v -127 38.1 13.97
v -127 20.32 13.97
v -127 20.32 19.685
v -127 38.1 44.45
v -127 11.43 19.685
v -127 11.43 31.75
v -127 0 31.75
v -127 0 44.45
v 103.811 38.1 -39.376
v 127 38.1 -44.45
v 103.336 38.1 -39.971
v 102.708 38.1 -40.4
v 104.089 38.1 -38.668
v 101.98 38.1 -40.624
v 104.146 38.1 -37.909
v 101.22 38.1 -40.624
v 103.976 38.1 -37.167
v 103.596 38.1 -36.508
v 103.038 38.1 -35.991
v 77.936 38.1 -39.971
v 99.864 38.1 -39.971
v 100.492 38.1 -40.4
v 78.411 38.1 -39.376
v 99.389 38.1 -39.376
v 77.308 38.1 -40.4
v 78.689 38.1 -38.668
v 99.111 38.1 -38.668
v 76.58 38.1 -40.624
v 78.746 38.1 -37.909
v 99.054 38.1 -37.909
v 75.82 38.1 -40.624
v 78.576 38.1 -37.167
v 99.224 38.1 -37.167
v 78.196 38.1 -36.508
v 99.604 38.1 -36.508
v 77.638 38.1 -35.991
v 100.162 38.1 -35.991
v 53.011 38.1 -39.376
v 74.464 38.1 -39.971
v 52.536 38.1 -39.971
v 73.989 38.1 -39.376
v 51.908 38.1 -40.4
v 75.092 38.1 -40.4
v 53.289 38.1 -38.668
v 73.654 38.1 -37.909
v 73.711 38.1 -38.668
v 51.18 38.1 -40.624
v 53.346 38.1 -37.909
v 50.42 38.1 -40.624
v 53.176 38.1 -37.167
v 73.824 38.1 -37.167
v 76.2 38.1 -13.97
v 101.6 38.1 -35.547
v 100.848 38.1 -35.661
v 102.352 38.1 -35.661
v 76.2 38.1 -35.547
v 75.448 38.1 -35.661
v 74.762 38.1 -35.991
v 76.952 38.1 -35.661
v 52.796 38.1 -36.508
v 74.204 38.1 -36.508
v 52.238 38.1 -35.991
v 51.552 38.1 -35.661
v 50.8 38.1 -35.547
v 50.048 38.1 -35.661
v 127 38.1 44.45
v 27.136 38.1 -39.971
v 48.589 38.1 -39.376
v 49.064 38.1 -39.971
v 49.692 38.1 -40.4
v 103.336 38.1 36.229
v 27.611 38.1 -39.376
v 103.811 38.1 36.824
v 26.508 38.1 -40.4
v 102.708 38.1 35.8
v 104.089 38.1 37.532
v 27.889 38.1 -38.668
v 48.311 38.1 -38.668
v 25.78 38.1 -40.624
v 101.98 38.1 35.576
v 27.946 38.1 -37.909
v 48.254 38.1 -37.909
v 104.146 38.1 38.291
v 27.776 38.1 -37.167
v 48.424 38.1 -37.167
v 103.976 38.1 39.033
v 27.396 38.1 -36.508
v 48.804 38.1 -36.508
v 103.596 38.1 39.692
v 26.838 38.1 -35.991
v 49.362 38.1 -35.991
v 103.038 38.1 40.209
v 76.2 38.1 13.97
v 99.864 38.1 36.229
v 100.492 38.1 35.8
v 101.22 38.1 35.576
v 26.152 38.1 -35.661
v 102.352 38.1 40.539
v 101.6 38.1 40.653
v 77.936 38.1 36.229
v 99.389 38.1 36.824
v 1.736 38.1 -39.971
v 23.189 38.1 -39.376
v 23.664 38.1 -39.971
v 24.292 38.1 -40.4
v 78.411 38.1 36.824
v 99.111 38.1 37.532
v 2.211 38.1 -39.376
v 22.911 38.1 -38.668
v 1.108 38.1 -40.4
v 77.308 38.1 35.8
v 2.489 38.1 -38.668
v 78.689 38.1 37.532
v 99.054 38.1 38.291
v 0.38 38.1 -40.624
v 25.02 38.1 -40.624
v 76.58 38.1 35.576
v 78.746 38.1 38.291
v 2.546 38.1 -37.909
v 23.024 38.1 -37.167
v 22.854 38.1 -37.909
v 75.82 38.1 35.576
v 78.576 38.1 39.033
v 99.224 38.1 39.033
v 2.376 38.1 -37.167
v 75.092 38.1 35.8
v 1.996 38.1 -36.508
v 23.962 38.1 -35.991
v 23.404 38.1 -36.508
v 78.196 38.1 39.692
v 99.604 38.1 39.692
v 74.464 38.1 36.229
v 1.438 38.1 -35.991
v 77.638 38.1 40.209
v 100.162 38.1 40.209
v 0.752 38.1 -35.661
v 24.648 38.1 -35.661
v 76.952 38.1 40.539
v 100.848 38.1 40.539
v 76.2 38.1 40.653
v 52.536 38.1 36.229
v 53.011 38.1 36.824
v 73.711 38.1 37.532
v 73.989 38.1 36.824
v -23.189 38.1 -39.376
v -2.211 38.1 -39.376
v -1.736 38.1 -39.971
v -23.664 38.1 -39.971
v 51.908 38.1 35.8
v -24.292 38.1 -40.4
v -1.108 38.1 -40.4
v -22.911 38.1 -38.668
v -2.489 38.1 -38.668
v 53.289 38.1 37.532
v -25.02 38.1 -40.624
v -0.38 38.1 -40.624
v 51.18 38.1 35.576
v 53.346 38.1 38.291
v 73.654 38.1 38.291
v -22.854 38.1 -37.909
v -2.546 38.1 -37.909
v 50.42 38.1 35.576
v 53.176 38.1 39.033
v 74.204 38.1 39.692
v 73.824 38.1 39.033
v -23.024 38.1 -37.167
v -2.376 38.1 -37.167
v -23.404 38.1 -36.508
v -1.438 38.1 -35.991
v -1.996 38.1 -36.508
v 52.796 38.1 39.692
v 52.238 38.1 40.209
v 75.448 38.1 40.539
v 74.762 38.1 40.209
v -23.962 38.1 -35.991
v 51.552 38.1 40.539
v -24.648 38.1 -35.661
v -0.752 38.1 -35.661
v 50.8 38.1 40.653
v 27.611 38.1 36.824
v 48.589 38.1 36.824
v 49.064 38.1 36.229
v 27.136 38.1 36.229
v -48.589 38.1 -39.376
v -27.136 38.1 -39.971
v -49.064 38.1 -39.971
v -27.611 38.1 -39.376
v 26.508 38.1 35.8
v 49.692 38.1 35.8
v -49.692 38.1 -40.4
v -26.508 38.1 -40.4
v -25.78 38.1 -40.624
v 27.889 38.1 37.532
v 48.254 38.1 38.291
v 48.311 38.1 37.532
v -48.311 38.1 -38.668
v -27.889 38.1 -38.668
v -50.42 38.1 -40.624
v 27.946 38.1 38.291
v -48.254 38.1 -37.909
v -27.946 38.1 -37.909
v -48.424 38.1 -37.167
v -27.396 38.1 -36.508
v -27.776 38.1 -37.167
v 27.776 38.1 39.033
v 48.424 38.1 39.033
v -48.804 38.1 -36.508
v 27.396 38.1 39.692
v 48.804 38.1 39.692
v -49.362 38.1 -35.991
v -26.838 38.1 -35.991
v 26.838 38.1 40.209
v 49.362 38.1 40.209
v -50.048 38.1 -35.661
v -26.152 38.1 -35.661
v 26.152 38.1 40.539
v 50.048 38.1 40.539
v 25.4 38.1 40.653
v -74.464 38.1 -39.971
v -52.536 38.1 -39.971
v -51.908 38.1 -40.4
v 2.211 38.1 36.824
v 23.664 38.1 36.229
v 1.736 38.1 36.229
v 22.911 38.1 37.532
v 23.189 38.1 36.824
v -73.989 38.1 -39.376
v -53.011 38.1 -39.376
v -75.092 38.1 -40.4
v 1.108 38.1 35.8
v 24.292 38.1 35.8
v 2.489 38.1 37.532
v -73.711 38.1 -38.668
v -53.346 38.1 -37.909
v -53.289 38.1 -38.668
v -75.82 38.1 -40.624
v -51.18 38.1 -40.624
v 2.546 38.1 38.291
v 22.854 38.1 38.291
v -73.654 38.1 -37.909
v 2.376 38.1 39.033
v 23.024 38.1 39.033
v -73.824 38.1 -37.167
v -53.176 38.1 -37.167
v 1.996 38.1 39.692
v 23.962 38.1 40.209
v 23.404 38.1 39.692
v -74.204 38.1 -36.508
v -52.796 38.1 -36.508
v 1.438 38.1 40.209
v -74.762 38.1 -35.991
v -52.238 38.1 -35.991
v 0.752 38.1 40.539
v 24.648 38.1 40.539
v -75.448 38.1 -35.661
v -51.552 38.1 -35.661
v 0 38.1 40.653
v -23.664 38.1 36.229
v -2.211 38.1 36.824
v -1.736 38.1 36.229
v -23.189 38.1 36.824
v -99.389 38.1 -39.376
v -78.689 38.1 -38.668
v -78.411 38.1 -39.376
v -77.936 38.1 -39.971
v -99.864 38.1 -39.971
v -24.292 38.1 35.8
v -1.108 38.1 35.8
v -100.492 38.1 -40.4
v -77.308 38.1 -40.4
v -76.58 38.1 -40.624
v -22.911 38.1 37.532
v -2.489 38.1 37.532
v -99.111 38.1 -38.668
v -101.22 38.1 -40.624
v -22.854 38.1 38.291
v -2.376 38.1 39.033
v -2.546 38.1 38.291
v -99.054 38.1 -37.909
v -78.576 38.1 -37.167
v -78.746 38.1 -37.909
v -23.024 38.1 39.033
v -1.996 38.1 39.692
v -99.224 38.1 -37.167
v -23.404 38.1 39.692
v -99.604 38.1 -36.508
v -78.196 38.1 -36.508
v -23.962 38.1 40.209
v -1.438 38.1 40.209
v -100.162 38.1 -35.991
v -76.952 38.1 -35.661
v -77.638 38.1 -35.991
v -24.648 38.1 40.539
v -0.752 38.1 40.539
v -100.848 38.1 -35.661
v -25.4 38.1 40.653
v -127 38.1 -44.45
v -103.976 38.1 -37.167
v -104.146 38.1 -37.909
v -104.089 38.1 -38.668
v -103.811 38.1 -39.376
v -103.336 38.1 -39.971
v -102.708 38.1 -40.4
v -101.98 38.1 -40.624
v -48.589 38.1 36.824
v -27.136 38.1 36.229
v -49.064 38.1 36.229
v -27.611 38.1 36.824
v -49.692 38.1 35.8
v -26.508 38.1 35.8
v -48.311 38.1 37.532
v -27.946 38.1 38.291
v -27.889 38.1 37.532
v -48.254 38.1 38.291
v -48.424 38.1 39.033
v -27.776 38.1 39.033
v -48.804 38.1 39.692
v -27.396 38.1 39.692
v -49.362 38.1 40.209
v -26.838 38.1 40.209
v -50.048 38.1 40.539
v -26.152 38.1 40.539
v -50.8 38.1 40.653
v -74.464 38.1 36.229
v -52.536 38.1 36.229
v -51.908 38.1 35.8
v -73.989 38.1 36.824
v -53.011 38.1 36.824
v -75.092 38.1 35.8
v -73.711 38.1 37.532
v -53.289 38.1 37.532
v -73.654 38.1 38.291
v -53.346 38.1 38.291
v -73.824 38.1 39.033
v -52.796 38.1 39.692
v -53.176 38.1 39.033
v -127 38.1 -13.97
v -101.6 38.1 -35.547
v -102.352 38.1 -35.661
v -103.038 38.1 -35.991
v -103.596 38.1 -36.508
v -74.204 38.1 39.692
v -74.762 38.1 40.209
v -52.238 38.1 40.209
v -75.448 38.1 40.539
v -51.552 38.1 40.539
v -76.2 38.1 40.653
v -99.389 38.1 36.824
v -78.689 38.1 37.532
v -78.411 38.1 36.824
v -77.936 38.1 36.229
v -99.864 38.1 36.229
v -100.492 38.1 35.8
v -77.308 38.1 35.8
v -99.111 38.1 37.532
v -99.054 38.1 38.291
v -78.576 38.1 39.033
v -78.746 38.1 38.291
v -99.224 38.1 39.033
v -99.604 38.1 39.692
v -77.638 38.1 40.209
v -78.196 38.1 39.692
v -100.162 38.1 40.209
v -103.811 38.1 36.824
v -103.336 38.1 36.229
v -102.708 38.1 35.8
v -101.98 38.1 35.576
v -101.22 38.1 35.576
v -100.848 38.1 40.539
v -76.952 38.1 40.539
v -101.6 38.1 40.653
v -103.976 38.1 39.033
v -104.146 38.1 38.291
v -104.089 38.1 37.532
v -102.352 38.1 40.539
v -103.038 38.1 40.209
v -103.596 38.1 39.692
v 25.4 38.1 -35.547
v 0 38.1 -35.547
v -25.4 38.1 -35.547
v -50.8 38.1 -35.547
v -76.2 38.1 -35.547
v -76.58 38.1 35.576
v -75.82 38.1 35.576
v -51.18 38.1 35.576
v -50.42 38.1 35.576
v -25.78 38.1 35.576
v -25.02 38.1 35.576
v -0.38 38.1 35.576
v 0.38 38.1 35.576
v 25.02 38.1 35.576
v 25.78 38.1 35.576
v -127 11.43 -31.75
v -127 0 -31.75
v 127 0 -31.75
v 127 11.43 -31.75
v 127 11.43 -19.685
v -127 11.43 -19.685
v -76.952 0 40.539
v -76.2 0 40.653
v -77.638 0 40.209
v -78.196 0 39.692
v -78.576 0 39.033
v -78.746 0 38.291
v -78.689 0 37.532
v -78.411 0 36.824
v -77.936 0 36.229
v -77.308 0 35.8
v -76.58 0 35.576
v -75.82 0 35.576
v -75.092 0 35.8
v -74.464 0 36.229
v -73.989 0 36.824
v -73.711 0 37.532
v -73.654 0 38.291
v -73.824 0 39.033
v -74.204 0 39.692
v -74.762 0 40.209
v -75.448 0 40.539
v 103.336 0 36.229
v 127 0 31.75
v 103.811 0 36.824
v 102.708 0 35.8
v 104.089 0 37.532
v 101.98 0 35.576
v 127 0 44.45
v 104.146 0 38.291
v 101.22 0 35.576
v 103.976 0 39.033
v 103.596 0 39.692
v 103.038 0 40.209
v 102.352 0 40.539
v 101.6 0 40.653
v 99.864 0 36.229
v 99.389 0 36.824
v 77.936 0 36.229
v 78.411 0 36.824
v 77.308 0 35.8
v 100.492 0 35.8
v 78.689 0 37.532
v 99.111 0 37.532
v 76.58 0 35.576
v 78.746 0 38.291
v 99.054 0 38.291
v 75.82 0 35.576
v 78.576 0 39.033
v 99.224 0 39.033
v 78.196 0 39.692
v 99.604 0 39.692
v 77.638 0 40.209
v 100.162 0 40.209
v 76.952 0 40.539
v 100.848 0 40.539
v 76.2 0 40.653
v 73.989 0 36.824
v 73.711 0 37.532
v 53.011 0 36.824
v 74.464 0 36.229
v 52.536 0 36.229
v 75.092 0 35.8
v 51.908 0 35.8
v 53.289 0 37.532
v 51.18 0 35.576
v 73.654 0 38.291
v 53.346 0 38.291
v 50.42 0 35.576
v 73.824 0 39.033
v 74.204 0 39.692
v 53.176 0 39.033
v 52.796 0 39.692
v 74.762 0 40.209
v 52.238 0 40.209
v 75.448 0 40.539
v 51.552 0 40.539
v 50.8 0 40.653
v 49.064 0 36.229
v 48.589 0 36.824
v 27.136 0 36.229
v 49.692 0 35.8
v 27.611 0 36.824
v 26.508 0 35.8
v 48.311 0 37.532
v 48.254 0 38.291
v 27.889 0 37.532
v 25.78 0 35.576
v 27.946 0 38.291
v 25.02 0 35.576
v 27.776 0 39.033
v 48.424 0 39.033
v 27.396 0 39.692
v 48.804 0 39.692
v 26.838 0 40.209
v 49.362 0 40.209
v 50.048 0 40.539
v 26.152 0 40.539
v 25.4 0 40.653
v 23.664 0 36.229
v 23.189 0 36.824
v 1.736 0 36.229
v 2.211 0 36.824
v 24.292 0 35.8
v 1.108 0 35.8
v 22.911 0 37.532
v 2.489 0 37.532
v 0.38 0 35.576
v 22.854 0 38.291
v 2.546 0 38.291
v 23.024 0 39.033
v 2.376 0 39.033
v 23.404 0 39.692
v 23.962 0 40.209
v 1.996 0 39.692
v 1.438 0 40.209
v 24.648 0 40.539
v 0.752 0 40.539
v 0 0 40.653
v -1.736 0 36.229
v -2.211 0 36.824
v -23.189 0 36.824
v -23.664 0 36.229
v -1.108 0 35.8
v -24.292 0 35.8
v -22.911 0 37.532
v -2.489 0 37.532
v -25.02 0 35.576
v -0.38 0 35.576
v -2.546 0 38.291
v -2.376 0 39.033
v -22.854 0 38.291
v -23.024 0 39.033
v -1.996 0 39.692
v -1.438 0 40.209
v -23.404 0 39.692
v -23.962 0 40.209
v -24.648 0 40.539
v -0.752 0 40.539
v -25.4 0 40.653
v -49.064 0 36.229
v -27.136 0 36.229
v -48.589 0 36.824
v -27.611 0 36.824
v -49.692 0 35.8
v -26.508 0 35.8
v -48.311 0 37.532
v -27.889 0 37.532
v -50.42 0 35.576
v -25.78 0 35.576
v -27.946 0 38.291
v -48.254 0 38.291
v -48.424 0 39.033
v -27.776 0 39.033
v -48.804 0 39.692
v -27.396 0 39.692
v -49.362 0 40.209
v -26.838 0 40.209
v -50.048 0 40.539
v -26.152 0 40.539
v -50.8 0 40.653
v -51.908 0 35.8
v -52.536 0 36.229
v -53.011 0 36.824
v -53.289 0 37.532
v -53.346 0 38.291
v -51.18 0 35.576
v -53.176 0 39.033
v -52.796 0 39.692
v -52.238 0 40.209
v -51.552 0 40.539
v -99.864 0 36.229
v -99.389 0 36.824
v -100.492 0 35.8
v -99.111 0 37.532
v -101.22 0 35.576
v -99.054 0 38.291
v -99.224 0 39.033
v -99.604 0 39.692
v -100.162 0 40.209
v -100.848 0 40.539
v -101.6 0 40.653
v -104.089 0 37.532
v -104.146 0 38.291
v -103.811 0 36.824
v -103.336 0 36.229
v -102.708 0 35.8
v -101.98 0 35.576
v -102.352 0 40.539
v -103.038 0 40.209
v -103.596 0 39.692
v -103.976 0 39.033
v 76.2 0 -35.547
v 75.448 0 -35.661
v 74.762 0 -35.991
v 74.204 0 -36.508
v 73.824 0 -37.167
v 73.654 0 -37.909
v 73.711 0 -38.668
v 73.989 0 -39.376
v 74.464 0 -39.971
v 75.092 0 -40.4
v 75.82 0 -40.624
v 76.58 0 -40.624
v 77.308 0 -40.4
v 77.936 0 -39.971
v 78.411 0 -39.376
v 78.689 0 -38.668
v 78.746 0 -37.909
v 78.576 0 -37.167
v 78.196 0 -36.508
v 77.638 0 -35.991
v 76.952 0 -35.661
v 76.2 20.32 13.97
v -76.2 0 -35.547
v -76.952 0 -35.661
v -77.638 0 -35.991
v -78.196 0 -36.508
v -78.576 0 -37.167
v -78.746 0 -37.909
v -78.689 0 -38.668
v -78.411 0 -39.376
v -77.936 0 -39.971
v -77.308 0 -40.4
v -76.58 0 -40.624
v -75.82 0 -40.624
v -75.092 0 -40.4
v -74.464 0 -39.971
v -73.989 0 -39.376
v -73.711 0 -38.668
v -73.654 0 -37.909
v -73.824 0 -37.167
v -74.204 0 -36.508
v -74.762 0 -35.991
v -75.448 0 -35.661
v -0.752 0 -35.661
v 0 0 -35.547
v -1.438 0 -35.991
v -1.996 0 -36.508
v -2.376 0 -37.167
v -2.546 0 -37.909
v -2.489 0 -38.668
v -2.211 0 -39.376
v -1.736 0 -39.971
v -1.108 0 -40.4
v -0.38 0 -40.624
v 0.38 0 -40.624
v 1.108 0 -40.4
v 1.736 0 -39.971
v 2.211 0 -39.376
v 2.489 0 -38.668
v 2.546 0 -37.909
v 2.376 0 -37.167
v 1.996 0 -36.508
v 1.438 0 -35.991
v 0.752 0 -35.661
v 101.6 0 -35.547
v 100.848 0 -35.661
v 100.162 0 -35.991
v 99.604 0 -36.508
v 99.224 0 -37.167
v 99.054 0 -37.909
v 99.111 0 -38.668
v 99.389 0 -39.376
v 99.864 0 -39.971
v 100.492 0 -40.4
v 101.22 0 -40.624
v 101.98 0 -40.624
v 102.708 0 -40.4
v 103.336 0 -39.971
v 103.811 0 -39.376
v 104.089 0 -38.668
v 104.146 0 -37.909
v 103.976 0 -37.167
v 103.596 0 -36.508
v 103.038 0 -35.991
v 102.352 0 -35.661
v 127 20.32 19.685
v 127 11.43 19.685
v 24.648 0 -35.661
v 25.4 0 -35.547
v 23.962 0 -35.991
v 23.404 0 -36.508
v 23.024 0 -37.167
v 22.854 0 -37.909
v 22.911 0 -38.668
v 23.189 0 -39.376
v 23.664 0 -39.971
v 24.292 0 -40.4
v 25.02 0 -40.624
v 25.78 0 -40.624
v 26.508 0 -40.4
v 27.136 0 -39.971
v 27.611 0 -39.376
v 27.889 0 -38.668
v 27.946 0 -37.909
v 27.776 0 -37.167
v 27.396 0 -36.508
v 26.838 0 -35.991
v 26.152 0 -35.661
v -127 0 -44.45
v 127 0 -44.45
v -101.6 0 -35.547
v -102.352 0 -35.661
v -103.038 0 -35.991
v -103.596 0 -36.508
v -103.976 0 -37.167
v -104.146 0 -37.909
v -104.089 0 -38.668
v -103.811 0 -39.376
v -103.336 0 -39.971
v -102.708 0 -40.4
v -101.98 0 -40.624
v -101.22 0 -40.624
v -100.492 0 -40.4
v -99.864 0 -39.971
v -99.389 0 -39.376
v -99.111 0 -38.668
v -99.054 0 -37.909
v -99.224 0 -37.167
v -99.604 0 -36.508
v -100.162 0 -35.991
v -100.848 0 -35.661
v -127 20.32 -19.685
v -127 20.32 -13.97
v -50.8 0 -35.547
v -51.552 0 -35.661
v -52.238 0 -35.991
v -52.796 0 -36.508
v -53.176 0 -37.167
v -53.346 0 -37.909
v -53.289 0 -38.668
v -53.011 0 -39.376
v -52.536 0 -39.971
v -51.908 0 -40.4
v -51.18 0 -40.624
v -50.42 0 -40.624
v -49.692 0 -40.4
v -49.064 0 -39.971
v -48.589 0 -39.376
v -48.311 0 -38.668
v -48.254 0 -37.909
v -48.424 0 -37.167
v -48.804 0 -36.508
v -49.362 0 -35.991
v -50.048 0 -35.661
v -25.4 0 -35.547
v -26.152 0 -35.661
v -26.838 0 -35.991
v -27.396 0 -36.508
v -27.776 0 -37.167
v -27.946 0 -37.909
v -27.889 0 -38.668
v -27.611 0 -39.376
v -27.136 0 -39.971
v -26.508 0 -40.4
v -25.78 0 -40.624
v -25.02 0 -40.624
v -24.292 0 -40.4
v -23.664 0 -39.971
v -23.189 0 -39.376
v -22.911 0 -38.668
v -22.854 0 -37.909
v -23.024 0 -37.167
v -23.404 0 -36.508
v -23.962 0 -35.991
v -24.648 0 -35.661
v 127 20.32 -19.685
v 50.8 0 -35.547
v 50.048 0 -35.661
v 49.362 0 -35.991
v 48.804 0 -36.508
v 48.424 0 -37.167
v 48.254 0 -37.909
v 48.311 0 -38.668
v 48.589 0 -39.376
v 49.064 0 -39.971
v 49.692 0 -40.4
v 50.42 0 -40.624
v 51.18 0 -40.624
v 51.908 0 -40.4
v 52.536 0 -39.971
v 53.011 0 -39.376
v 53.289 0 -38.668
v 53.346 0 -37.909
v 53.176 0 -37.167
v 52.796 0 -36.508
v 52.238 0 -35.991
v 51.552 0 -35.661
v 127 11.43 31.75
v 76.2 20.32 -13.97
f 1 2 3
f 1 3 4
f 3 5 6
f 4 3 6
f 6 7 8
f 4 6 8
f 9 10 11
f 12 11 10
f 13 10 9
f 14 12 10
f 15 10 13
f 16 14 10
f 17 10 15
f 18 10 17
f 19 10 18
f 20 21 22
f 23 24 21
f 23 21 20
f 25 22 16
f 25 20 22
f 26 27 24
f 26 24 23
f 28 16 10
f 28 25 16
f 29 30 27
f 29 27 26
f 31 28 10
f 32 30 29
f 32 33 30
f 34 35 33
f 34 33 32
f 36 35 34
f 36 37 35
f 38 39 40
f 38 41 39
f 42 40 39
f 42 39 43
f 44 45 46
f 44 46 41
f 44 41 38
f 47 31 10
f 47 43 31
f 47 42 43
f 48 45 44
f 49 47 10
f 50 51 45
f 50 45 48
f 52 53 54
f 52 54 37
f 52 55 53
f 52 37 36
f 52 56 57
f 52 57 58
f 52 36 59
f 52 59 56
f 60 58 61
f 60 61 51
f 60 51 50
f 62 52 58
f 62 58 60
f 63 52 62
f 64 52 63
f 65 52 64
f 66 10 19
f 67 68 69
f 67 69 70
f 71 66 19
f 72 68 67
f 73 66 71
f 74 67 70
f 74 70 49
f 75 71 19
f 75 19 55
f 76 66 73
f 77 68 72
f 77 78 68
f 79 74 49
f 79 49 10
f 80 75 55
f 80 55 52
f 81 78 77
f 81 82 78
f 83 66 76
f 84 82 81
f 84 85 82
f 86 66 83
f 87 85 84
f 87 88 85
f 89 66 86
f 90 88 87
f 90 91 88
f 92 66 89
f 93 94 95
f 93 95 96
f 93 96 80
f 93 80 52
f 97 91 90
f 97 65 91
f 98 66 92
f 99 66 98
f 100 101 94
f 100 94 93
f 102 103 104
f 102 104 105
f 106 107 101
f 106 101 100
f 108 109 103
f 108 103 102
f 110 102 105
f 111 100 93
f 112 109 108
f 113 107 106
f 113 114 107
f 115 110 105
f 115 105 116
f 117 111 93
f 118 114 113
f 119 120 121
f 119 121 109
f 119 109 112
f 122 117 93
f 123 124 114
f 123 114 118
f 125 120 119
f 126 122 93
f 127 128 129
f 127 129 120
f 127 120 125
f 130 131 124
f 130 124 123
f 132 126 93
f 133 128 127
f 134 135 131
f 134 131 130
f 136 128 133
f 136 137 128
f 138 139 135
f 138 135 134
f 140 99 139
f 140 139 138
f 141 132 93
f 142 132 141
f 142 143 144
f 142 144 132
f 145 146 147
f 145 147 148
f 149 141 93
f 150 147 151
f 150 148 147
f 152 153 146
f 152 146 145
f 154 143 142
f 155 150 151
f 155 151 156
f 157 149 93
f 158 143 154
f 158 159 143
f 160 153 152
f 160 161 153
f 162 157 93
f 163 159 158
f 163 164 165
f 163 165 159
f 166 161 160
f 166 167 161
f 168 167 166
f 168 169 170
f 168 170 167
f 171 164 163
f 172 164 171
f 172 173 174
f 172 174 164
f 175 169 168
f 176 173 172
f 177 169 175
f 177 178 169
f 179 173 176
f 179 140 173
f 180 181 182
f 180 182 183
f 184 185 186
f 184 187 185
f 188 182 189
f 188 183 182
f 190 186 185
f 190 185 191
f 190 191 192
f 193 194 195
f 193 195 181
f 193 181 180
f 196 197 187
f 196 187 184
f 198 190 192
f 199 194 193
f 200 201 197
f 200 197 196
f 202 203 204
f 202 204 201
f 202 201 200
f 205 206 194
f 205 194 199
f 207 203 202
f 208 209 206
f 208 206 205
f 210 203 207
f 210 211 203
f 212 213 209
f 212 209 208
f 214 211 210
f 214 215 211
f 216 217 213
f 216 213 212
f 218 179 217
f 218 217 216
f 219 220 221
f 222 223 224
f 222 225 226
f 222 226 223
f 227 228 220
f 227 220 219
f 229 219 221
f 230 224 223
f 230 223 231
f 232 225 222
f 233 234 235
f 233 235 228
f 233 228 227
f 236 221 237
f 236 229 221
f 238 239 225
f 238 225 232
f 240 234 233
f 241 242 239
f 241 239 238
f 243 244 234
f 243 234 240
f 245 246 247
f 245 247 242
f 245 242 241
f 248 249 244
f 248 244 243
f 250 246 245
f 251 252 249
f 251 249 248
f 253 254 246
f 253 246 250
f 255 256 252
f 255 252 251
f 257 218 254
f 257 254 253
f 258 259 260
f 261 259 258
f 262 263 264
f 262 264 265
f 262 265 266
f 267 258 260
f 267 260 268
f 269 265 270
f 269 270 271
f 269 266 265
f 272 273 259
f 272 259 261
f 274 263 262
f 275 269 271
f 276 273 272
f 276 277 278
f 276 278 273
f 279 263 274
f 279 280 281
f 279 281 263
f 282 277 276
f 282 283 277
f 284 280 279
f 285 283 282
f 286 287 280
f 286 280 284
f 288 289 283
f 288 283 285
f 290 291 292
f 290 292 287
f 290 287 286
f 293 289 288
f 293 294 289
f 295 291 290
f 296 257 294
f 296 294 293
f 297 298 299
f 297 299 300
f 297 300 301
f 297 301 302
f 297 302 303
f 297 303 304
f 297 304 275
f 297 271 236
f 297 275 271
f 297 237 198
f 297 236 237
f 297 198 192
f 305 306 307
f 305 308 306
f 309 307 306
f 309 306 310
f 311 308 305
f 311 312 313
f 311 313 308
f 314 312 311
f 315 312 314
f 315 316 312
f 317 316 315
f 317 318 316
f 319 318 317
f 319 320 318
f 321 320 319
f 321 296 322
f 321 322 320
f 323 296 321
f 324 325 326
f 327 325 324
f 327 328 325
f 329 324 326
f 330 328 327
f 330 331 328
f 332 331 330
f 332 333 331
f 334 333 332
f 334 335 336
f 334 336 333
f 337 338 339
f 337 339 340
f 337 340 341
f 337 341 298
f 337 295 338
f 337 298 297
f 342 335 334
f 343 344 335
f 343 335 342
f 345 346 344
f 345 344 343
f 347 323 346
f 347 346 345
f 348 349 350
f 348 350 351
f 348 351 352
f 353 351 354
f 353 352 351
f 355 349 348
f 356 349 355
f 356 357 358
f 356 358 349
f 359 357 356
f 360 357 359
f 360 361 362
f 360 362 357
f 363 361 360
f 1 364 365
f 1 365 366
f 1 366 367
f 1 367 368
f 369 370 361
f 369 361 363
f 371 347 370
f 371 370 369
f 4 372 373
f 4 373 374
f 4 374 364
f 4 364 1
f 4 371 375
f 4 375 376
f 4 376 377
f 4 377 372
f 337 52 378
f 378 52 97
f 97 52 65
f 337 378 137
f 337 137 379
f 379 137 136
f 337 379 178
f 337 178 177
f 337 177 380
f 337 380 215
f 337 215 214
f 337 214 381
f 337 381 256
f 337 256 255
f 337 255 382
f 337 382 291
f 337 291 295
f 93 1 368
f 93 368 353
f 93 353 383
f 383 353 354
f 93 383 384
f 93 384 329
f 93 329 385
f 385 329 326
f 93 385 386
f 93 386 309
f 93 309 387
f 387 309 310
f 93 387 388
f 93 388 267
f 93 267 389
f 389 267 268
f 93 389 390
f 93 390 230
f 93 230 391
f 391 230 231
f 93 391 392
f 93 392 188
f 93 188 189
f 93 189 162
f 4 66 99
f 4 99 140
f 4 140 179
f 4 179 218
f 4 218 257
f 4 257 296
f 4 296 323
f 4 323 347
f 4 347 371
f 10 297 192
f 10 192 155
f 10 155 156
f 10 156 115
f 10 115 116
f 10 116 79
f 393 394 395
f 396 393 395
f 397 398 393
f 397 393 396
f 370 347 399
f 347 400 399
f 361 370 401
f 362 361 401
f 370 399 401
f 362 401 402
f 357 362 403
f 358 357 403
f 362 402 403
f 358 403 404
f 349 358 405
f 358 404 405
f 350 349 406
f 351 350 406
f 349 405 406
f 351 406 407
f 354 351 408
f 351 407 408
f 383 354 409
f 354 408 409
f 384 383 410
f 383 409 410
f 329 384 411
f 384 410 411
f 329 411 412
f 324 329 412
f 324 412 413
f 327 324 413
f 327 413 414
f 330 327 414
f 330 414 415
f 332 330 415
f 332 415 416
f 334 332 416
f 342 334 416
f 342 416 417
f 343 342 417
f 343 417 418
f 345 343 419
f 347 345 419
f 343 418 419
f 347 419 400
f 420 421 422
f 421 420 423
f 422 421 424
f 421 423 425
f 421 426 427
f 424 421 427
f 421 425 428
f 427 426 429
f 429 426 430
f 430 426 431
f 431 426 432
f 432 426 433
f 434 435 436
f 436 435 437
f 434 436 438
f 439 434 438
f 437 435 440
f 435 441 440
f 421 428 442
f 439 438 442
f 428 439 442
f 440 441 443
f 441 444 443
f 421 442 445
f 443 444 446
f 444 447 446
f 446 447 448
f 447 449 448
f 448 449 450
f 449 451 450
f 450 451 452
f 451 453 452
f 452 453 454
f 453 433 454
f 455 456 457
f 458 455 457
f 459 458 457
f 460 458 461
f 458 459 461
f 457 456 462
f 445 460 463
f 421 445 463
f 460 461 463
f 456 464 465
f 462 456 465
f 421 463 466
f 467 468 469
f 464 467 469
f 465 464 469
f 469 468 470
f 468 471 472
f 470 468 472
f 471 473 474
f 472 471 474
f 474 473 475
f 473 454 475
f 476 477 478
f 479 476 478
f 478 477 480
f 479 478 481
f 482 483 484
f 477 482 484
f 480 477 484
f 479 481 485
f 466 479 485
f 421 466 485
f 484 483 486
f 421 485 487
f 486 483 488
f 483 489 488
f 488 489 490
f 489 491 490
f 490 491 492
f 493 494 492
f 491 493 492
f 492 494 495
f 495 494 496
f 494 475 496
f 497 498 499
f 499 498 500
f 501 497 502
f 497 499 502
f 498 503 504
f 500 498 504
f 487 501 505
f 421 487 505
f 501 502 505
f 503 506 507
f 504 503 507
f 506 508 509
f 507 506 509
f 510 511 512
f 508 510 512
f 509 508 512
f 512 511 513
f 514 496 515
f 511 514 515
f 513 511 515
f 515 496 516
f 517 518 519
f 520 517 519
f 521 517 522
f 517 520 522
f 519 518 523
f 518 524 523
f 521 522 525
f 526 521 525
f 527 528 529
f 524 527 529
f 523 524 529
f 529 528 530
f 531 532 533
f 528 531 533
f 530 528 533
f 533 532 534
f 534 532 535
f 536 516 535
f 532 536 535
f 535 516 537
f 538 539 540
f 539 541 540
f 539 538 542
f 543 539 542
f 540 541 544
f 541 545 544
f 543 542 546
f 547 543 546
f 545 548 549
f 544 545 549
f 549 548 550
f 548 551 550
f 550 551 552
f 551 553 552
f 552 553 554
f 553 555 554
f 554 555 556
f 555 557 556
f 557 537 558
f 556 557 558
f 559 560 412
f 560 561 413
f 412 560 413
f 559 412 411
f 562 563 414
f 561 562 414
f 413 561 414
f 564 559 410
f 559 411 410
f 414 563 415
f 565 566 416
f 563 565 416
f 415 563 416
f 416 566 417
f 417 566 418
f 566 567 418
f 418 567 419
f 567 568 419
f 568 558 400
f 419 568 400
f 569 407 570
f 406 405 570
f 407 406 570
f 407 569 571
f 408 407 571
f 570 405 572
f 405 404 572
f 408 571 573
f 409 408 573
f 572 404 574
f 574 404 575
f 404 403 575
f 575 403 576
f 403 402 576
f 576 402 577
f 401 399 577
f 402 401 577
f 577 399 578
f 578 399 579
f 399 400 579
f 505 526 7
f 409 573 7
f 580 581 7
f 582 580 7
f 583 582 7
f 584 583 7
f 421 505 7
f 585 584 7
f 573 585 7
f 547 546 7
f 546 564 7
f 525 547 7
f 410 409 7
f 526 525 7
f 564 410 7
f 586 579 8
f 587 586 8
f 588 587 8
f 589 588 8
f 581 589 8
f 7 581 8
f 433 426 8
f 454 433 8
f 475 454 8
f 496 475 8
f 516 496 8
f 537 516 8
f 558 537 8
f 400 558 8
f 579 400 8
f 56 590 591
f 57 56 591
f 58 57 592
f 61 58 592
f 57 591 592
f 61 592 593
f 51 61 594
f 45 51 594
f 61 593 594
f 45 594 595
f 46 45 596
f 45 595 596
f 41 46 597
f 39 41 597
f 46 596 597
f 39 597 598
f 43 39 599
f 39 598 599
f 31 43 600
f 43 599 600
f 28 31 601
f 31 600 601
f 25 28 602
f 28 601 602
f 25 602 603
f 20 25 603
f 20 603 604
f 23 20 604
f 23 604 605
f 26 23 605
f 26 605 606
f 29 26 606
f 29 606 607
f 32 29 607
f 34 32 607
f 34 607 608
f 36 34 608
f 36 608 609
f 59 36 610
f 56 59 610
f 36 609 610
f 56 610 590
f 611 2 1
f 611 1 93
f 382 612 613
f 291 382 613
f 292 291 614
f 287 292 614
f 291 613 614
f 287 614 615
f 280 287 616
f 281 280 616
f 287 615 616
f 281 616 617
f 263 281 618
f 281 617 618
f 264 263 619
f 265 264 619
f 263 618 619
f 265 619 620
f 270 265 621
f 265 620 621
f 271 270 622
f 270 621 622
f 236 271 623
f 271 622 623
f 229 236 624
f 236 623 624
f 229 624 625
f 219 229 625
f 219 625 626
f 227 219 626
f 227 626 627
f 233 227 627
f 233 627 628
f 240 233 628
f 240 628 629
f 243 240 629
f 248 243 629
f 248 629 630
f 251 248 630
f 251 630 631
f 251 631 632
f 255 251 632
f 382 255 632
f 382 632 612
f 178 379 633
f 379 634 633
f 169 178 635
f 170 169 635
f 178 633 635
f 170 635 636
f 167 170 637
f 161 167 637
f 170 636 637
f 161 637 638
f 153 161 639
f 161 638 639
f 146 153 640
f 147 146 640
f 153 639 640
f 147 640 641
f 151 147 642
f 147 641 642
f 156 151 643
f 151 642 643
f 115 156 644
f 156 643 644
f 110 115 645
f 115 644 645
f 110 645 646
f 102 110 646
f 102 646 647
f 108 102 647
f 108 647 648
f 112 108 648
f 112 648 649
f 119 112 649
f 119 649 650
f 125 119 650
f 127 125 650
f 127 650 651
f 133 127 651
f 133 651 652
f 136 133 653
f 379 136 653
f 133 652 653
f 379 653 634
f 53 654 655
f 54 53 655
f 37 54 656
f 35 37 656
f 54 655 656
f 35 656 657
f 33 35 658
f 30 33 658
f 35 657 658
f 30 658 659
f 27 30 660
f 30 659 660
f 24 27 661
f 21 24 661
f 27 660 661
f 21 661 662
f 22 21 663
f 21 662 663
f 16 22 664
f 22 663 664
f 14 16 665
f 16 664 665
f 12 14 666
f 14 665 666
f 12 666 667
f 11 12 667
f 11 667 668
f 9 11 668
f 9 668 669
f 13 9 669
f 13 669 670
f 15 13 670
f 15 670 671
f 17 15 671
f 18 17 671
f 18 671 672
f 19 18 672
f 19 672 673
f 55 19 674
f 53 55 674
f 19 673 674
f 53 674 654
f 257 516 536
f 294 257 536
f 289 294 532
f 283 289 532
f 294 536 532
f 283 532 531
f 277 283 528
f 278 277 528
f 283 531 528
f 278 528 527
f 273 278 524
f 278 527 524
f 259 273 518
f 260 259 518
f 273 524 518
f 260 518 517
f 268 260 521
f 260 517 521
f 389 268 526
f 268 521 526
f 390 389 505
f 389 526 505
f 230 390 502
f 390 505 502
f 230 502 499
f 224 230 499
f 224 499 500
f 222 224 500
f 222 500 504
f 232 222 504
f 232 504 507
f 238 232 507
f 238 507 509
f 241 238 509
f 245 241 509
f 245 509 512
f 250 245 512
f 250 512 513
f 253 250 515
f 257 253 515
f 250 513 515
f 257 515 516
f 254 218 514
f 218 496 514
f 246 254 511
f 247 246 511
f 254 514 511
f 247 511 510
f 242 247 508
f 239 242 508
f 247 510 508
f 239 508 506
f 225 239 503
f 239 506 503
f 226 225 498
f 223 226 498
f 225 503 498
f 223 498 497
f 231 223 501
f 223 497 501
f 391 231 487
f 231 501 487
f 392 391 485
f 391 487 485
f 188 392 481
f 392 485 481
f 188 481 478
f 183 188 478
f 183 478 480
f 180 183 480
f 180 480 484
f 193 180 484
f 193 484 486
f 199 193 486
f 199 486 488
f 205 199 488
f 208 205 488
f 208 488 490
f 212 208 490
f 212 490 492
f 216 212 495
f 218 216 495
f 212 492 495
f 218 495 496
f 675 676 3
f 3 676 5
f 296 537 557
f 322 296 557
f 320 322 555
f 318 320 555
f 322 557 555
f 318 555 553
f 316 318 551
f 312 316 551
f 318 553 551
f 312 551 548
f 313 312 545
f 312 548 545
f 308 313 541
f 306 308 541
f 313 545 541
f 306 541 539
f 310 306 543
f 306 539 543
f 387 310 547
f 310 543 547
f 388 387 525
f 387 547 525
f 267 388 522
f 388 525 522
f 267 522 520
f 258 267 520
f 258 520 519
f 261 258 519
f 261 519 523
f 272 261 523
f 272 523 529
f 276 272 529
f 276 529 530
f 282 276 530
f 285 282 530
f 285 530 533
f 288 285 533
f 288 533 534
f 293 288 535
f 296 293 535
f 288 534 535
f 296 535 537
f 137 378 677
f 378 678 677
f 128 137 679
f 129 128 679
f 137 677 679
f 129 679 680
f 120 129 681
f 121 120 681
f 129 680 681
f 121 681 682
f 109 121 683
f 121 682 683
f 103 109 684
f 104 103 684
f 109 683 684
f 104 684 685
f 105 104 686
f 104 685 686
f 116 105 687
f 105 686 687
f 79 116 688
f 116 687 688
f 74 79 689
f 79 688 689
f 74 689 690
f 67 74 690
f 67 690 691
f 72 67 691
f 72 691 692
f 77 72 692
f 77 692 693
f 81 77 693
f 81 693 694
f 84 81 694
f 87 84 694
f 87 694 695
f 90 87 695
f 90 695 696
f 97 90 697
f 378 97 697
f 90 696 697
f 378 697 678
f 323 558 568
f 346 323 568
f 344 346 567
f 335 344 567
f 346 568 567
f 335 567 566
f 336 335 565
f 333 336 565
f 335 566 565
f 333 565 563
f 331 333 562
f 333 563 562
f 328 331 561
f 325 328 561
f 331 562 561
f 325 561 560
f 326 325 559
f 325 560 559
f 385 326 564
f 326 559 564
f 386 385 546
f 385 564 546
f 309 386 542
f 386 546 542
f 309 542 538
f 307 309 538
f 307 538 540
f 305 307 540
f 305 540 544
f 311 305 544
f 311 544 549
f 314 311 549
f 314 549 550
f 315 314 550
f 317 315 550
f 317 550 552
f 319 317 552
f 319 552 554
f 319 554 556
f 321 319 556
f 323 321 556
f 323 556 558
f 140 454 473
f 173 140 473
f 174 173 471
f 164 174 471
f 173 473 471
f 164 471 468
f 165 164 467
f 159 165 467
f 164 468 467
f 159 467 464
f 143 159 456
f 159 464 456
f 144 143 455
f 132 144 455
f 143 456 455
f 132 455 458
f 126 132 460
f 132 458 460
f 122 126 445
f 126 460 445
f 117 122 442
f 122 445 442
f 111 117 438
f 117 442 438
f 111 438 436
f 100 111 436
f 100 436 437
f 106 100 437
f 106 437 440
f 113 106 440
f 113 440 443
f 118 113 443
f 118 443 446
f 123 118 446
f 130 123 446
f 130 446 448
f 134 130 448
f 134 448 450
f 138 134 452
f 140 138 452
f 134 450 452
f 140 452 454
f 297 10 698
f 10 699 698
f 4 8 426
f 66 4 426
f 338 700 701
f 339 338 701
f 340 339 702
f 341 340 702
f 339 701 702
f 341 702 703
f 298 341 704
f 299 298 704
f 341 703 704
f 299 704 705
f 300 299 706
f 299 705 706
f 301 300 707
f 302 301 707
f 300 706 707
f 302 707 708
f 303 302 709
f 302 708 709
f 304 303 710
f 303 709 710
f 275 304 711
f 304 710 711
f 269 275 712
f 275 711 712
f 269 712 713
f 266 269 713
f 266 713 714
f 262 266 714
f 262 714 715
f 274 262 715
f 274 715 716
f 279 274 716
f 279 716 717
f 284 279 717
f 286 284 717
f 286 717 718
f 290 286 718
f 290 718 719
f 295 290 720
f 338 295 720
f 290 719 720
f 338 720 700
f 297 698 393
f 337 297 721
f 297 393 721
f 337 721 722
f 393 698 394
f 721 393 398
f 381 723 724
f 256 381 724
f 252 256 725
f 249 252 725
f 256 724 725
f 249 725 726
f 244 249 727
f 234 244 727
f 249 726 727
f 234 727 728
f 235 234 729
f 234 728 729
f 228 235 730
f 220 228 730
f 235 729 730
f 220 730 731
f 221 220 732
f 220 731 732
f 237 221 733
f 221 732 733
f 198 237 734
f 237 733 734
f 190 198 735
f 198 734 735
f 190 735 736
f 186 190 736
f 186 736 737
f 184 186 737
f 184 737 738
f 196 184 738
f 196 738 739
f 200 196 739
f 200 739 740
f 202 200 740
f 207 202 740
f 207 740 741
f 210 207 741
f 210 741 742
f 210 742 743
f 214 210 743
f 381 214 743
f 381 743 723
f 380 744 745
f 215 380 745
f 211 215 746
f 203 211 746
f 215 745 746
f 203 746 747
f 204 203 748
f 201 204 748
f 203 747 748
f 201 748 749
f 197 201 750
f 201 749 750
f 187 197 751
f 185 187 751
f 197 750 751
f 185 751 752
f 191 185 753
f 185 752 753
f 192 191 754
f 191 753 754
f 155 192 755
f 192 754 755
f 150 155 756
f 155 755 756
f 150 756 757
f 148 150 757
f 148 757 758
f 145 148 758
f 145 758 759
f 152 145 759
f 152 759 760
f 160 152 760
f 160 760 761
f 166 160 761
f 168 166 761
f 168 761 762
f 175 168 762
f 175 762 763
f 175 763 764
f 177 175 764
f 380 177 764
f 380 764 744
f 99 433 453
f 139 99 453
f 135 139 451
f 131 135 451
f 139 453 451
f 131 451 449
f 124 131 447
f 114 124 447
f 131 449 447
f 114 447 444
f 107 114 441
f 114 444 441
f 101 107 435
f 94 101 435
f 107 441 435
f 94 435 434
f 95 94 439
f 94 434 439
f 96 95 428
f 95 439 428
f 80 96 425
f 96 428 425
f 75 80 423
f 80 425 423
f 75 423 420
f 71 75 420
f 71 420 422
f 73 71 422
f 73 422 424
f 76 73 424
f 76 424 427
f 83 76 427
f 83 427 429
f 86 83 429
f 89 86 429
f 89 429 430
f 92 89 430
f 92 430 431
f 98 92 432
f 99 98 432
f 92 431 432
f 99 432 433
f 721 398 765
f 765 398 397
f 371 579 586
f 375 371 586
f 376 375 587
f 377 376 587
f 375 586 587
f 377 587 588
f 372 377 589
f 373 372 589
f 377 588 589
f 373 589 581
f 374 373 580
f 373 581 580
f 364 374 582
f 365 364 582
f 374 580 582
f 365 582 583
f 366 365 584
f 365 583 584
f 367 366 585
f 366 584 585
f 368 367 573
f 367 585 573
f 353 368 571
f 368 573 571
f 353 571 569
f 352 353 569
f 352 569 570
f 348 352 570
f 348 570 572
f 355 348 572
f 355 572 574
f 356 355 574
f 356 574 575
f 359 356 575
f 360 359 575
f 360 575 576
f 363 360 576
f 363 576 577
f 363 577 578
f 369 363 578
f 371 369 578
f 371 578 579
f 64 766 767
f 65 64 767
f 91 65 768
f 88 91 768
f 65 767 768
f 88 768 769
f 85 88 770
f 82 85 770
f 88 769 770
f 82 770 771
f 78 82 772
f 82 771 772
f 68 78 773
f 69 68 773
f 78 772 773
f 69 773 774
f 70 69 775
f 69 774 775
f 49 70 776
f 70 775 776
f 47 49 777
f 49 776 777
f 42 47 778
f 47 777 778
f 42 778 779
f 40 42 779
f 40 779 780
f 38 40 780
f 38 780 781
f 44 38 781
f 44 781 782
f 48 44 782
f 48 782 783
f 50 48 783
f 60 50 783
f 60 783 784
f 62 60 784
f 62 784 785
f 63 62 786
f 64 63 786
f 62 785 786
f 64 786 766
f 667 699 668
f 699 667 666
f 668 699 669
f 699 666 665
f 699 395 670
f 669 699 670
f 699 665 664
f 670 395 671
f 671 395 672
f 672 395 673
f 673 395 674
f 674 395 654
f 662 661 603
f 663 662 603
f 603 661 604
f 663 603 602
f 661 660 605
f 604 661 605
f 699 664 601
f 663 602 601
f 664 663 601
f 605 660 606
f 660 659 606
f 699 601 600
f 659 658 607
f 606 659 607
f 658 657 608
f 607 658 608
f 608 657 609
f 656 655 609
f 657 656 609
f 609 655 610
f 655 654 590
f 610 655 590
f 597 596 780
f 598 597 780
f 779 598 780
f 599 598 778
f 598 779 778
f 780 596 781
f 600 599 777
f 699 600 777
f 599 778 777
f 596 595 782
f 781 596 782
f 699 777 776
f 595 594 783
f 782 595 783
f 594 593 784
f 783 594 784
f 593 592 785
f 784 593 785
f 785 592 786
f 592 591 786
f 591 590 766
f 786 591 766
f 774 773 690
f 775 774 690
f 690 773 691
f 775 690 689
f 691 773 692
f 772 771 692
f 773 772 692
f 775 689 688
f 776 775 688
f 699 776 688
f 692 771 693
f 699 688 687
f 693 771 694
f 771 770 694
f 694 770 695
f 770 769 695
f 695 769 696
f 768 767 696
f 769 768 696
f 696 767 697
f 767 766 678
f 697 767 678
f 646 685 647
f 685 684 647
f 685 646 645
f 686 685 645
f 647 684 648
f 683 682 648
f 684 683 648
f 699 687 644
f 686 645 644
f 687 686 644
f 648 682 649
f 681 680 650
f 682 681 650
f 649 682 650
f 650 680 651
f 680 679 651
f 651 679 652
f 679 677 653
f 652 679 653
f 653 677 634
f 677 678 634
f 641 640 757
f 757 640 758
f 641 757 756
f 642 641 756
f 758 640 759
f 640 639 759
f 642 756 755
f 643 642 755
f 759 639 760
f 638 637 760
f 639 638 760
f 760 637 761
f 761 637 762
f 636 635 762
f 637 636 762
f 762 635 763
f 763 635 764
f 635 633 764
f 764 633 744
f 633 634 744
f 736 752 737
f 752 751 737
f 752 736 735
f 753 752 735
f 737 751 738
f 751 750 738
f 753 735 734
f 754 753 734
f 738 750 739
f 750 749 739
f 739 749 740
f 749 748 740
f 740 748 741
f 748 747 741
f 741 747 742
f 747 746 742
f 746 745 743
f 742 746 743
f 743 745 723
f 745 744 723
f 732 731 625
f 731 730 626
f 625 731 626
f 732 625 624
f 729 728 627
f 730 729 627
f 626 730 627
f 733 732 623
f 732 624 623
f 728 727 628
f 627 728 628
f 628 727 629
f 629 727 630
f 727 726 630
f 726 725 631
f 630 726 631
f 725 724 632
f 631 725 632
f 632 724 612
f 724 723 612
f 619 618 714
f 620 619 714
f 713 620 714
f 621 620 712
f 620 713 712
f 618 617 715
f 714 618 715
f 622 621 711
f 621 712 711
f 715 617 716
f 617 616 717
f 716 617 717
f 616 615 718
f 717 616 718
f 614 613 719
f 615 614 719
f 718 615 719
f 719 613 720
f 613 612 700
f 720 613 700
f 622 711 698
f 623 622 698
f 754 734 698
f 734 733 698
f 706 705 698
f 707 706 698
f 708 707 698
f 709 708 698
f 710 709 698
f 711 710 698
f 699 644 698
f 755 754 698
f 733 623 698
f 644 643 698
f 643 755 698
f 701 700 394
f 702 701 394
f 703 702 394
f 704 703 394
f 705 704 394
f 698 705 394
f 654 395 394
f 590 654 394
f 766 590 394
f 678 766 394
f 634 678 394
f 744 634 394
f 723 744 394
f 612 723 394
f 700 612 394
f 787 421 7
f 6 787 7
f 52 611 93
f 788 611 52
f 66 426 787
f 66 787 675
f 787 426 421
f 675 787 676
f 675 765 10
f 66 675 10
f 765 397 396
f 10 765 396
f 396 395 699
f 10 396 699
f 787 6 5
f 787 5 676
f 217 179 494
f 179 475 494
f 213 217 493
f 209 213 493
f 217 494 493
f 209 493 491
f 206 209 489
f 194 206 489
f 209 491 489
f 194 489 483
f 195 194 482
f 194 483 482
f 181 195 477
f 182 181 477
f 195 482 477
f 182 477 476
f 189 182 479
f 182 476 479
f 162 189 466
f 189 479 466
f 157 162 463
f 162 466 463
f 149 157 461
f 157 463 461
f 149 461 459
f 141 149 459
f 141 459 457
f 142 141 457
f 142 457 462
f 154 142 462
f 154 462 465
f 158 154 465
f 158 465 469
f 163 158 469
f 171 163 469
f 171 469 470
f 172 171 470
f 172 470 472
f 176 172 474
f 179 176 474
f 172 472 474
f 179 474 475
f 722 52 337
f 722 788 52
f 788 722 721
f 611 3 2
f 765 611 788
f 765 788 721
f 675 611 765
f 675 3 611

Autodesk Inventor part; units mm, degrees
ref_plane "YZ Plane" through (0, 0, 0) normal (1, 0, 0) x (0, 1, 0)
ref_plane "XZ Plane" through (0, 0, 0) normal (0, 1, 0) x (-1, 0, 0)
sketch "Sketch1" plane through (0, 0, 0) normal (0, 1, 0) x (-1, 0, 0)
  line L0 (127, 44.45) -> (-127, 44.45)
  line L1 (-127, 44.45) -> (-127, -44.45)
  line L2 (-127, -44.45) -> (127, -44.45)
  line L3 (127, -44.45) -> (127, 44.45)
  line L4 (127, 44.45) -> (-127, -44.45) construction
  line L5 (-127, 44.45) -> (127, -44.45) construction
  point P0 (0, 0)
  dimension "d0" = 254
  dimension "d1" = 88.9
extrude "Extrusion1" add sketch "Sketch1" along normal blind 38.1
sketch "Sketch2" plane through (0, 0, 0) normal (0, -1, 0) x (1, 0, 0)
  line L0 (-131.2333, 19.685) -> (-131.2333, -19.685)
  line L1 (-131.2333, -19.685) -> (131.2333, -19.685)
  line L2 (131.2333, -19.685) -> (131.2333, 19.685)
  line L3 (131.2333, 19.685) -> (-131.2333, 19.685)
  line L4 (-131.2333, 19.685) -> (131.2333, -19.685) construction
  line L5 (-131.2333, -19.685) -> (131.2333, 19.685) construction
  point P0 (0, 0)
  dimension "d4" = 39.37
extrude "Extrusion2" cut sketch "Sketch2" against normal blind 20.32
sketch "Sketch3" plane through (0, 20.32, 0) normal (0, -1, 0) x (1, 0, 0)
  line L0 (-127, -19.685) -> (-127, 19.685) projected
  line L1 (76.2, 13.97) -> (76.2, -13.97)
  line L2 (76.2, -13.97) -> (-127, -13.97)
  line L3 (-127, -13.97) -> (-127, 13.97)
  line L4 (-127, 13.97) -> (76.2, 13.97)
  line L5 (76.2, 13.97) -> (-127, -13.97) construction
  line L6 (76.2, -13.97) -> (-127, 13.97) construction
  point P0 (0, 0)
  point P1 (-25.4, 0)
  point P2 (-127, -13.97)
  dimension "d7" = 101.6
  dimension "d8" = 27.94
extrude "Extrusion3" cut sketch "Sketch3" against normal through all
sketch "Sketch4" plane through (0, 0, 0) normal (0, -1, 0) x (1, 0, 0)
  line L0 (127, 31.75) -> (-127, 31.75)
  line L1 (-127, 31.75) -> (-127, -31.75)
  line L2 (-127, -31.75) -> (127, -31.75)
  line L3 (127, -31.75) -> (127, 31.75)
  line L4 (127, 31.75) -> (-127, -31.75) construction
  line L5 (-127, 31.75) -> (127, -31.75) construction
  point P0 (0, 0)
  dimension "d11" = 63.5
  dimension "d12" = 254
extrude "Extrusion4" cut sketch "Sketch4" against normal blind 11.43
sketch "Sketch5" plane through (0, 38.1, 0) normal (0, 1, 0) x (1, 0, 0)
  line L0 (127, 44.45) -> (-127, 44.45) projected
  line L1 (-127, 44.45) -> (-127, 13.97) projected
  line L2 (-101.6, 38.1) -> (127, 38.1) construction
  line L3 (-101.6, 38.1) -> (-101.6, -44.45) construction
  line L4 (-127, -44.45) -> (127, -44.45) construction
  point P0 (0, 0)
  point P1 (-76.2, 38.1)
  point P2 (-50.8, 38.1)
  point P3 (-25.4, 38.1)
  point P4 (0, 38.1)
  point P5 (25.4, 38.1)
  point P6 (50.8, 38.1)
  point P7 (76.2, 38.1)
  point P8 (101.6, 38.1)
  point P9 (-101.6, -38.1)
  point P10 (-76.2, -38.1)
  point P11 (-50.8, -38.1)
  point P12 (-25.4, -38.1)
  point P13 (0, -38.1)
  point P14 (25.4, -38.1)
  point P15 (50.8, -38.1)
  point P16 (76.2, -38.1)
  point P17 (101.6, -38.1)
  dimension "d15" = 6.35
  dimension "d16" = 25.4
  dimension "d19" = 25.4
  dimension "d22" = 76.2
hole "Hole1" at (-101.6, 38.1, -38.1) at (-76.2, 38.1, -38.1) at (-50.8, 38.1, -38.1) at (-25.4, 38.1, -38.1) at (0, 38.1, -38.1) at (25.4, 38.1, -38.1) at (50.8, 38.1, -38.1) at (76.2, 38.1, -38.1) at (101.6, 38.1, -38.1) at (-101.6, 38.1, 38.1) at (-76.2, 38.1, 38.1) at (-50.8, 38.1, 38.1) at (-25.4, 38.1, 38.1) at (0, 38.1, 38.1) at (25.4, 38.1, 38.1) at (50.8, 38.1, 38.1) at (76.2, 38.1, 38.1) at (101.6, 38.1, 38.1) direction (0, -1, 0) diameter 5.1054 end through all clearance for "Hex Machine Screw" size "#10" standard "Ansi Unified Screw Threads"
properties part number "pistonHousingV03-8-in" material "PET Plastic"
